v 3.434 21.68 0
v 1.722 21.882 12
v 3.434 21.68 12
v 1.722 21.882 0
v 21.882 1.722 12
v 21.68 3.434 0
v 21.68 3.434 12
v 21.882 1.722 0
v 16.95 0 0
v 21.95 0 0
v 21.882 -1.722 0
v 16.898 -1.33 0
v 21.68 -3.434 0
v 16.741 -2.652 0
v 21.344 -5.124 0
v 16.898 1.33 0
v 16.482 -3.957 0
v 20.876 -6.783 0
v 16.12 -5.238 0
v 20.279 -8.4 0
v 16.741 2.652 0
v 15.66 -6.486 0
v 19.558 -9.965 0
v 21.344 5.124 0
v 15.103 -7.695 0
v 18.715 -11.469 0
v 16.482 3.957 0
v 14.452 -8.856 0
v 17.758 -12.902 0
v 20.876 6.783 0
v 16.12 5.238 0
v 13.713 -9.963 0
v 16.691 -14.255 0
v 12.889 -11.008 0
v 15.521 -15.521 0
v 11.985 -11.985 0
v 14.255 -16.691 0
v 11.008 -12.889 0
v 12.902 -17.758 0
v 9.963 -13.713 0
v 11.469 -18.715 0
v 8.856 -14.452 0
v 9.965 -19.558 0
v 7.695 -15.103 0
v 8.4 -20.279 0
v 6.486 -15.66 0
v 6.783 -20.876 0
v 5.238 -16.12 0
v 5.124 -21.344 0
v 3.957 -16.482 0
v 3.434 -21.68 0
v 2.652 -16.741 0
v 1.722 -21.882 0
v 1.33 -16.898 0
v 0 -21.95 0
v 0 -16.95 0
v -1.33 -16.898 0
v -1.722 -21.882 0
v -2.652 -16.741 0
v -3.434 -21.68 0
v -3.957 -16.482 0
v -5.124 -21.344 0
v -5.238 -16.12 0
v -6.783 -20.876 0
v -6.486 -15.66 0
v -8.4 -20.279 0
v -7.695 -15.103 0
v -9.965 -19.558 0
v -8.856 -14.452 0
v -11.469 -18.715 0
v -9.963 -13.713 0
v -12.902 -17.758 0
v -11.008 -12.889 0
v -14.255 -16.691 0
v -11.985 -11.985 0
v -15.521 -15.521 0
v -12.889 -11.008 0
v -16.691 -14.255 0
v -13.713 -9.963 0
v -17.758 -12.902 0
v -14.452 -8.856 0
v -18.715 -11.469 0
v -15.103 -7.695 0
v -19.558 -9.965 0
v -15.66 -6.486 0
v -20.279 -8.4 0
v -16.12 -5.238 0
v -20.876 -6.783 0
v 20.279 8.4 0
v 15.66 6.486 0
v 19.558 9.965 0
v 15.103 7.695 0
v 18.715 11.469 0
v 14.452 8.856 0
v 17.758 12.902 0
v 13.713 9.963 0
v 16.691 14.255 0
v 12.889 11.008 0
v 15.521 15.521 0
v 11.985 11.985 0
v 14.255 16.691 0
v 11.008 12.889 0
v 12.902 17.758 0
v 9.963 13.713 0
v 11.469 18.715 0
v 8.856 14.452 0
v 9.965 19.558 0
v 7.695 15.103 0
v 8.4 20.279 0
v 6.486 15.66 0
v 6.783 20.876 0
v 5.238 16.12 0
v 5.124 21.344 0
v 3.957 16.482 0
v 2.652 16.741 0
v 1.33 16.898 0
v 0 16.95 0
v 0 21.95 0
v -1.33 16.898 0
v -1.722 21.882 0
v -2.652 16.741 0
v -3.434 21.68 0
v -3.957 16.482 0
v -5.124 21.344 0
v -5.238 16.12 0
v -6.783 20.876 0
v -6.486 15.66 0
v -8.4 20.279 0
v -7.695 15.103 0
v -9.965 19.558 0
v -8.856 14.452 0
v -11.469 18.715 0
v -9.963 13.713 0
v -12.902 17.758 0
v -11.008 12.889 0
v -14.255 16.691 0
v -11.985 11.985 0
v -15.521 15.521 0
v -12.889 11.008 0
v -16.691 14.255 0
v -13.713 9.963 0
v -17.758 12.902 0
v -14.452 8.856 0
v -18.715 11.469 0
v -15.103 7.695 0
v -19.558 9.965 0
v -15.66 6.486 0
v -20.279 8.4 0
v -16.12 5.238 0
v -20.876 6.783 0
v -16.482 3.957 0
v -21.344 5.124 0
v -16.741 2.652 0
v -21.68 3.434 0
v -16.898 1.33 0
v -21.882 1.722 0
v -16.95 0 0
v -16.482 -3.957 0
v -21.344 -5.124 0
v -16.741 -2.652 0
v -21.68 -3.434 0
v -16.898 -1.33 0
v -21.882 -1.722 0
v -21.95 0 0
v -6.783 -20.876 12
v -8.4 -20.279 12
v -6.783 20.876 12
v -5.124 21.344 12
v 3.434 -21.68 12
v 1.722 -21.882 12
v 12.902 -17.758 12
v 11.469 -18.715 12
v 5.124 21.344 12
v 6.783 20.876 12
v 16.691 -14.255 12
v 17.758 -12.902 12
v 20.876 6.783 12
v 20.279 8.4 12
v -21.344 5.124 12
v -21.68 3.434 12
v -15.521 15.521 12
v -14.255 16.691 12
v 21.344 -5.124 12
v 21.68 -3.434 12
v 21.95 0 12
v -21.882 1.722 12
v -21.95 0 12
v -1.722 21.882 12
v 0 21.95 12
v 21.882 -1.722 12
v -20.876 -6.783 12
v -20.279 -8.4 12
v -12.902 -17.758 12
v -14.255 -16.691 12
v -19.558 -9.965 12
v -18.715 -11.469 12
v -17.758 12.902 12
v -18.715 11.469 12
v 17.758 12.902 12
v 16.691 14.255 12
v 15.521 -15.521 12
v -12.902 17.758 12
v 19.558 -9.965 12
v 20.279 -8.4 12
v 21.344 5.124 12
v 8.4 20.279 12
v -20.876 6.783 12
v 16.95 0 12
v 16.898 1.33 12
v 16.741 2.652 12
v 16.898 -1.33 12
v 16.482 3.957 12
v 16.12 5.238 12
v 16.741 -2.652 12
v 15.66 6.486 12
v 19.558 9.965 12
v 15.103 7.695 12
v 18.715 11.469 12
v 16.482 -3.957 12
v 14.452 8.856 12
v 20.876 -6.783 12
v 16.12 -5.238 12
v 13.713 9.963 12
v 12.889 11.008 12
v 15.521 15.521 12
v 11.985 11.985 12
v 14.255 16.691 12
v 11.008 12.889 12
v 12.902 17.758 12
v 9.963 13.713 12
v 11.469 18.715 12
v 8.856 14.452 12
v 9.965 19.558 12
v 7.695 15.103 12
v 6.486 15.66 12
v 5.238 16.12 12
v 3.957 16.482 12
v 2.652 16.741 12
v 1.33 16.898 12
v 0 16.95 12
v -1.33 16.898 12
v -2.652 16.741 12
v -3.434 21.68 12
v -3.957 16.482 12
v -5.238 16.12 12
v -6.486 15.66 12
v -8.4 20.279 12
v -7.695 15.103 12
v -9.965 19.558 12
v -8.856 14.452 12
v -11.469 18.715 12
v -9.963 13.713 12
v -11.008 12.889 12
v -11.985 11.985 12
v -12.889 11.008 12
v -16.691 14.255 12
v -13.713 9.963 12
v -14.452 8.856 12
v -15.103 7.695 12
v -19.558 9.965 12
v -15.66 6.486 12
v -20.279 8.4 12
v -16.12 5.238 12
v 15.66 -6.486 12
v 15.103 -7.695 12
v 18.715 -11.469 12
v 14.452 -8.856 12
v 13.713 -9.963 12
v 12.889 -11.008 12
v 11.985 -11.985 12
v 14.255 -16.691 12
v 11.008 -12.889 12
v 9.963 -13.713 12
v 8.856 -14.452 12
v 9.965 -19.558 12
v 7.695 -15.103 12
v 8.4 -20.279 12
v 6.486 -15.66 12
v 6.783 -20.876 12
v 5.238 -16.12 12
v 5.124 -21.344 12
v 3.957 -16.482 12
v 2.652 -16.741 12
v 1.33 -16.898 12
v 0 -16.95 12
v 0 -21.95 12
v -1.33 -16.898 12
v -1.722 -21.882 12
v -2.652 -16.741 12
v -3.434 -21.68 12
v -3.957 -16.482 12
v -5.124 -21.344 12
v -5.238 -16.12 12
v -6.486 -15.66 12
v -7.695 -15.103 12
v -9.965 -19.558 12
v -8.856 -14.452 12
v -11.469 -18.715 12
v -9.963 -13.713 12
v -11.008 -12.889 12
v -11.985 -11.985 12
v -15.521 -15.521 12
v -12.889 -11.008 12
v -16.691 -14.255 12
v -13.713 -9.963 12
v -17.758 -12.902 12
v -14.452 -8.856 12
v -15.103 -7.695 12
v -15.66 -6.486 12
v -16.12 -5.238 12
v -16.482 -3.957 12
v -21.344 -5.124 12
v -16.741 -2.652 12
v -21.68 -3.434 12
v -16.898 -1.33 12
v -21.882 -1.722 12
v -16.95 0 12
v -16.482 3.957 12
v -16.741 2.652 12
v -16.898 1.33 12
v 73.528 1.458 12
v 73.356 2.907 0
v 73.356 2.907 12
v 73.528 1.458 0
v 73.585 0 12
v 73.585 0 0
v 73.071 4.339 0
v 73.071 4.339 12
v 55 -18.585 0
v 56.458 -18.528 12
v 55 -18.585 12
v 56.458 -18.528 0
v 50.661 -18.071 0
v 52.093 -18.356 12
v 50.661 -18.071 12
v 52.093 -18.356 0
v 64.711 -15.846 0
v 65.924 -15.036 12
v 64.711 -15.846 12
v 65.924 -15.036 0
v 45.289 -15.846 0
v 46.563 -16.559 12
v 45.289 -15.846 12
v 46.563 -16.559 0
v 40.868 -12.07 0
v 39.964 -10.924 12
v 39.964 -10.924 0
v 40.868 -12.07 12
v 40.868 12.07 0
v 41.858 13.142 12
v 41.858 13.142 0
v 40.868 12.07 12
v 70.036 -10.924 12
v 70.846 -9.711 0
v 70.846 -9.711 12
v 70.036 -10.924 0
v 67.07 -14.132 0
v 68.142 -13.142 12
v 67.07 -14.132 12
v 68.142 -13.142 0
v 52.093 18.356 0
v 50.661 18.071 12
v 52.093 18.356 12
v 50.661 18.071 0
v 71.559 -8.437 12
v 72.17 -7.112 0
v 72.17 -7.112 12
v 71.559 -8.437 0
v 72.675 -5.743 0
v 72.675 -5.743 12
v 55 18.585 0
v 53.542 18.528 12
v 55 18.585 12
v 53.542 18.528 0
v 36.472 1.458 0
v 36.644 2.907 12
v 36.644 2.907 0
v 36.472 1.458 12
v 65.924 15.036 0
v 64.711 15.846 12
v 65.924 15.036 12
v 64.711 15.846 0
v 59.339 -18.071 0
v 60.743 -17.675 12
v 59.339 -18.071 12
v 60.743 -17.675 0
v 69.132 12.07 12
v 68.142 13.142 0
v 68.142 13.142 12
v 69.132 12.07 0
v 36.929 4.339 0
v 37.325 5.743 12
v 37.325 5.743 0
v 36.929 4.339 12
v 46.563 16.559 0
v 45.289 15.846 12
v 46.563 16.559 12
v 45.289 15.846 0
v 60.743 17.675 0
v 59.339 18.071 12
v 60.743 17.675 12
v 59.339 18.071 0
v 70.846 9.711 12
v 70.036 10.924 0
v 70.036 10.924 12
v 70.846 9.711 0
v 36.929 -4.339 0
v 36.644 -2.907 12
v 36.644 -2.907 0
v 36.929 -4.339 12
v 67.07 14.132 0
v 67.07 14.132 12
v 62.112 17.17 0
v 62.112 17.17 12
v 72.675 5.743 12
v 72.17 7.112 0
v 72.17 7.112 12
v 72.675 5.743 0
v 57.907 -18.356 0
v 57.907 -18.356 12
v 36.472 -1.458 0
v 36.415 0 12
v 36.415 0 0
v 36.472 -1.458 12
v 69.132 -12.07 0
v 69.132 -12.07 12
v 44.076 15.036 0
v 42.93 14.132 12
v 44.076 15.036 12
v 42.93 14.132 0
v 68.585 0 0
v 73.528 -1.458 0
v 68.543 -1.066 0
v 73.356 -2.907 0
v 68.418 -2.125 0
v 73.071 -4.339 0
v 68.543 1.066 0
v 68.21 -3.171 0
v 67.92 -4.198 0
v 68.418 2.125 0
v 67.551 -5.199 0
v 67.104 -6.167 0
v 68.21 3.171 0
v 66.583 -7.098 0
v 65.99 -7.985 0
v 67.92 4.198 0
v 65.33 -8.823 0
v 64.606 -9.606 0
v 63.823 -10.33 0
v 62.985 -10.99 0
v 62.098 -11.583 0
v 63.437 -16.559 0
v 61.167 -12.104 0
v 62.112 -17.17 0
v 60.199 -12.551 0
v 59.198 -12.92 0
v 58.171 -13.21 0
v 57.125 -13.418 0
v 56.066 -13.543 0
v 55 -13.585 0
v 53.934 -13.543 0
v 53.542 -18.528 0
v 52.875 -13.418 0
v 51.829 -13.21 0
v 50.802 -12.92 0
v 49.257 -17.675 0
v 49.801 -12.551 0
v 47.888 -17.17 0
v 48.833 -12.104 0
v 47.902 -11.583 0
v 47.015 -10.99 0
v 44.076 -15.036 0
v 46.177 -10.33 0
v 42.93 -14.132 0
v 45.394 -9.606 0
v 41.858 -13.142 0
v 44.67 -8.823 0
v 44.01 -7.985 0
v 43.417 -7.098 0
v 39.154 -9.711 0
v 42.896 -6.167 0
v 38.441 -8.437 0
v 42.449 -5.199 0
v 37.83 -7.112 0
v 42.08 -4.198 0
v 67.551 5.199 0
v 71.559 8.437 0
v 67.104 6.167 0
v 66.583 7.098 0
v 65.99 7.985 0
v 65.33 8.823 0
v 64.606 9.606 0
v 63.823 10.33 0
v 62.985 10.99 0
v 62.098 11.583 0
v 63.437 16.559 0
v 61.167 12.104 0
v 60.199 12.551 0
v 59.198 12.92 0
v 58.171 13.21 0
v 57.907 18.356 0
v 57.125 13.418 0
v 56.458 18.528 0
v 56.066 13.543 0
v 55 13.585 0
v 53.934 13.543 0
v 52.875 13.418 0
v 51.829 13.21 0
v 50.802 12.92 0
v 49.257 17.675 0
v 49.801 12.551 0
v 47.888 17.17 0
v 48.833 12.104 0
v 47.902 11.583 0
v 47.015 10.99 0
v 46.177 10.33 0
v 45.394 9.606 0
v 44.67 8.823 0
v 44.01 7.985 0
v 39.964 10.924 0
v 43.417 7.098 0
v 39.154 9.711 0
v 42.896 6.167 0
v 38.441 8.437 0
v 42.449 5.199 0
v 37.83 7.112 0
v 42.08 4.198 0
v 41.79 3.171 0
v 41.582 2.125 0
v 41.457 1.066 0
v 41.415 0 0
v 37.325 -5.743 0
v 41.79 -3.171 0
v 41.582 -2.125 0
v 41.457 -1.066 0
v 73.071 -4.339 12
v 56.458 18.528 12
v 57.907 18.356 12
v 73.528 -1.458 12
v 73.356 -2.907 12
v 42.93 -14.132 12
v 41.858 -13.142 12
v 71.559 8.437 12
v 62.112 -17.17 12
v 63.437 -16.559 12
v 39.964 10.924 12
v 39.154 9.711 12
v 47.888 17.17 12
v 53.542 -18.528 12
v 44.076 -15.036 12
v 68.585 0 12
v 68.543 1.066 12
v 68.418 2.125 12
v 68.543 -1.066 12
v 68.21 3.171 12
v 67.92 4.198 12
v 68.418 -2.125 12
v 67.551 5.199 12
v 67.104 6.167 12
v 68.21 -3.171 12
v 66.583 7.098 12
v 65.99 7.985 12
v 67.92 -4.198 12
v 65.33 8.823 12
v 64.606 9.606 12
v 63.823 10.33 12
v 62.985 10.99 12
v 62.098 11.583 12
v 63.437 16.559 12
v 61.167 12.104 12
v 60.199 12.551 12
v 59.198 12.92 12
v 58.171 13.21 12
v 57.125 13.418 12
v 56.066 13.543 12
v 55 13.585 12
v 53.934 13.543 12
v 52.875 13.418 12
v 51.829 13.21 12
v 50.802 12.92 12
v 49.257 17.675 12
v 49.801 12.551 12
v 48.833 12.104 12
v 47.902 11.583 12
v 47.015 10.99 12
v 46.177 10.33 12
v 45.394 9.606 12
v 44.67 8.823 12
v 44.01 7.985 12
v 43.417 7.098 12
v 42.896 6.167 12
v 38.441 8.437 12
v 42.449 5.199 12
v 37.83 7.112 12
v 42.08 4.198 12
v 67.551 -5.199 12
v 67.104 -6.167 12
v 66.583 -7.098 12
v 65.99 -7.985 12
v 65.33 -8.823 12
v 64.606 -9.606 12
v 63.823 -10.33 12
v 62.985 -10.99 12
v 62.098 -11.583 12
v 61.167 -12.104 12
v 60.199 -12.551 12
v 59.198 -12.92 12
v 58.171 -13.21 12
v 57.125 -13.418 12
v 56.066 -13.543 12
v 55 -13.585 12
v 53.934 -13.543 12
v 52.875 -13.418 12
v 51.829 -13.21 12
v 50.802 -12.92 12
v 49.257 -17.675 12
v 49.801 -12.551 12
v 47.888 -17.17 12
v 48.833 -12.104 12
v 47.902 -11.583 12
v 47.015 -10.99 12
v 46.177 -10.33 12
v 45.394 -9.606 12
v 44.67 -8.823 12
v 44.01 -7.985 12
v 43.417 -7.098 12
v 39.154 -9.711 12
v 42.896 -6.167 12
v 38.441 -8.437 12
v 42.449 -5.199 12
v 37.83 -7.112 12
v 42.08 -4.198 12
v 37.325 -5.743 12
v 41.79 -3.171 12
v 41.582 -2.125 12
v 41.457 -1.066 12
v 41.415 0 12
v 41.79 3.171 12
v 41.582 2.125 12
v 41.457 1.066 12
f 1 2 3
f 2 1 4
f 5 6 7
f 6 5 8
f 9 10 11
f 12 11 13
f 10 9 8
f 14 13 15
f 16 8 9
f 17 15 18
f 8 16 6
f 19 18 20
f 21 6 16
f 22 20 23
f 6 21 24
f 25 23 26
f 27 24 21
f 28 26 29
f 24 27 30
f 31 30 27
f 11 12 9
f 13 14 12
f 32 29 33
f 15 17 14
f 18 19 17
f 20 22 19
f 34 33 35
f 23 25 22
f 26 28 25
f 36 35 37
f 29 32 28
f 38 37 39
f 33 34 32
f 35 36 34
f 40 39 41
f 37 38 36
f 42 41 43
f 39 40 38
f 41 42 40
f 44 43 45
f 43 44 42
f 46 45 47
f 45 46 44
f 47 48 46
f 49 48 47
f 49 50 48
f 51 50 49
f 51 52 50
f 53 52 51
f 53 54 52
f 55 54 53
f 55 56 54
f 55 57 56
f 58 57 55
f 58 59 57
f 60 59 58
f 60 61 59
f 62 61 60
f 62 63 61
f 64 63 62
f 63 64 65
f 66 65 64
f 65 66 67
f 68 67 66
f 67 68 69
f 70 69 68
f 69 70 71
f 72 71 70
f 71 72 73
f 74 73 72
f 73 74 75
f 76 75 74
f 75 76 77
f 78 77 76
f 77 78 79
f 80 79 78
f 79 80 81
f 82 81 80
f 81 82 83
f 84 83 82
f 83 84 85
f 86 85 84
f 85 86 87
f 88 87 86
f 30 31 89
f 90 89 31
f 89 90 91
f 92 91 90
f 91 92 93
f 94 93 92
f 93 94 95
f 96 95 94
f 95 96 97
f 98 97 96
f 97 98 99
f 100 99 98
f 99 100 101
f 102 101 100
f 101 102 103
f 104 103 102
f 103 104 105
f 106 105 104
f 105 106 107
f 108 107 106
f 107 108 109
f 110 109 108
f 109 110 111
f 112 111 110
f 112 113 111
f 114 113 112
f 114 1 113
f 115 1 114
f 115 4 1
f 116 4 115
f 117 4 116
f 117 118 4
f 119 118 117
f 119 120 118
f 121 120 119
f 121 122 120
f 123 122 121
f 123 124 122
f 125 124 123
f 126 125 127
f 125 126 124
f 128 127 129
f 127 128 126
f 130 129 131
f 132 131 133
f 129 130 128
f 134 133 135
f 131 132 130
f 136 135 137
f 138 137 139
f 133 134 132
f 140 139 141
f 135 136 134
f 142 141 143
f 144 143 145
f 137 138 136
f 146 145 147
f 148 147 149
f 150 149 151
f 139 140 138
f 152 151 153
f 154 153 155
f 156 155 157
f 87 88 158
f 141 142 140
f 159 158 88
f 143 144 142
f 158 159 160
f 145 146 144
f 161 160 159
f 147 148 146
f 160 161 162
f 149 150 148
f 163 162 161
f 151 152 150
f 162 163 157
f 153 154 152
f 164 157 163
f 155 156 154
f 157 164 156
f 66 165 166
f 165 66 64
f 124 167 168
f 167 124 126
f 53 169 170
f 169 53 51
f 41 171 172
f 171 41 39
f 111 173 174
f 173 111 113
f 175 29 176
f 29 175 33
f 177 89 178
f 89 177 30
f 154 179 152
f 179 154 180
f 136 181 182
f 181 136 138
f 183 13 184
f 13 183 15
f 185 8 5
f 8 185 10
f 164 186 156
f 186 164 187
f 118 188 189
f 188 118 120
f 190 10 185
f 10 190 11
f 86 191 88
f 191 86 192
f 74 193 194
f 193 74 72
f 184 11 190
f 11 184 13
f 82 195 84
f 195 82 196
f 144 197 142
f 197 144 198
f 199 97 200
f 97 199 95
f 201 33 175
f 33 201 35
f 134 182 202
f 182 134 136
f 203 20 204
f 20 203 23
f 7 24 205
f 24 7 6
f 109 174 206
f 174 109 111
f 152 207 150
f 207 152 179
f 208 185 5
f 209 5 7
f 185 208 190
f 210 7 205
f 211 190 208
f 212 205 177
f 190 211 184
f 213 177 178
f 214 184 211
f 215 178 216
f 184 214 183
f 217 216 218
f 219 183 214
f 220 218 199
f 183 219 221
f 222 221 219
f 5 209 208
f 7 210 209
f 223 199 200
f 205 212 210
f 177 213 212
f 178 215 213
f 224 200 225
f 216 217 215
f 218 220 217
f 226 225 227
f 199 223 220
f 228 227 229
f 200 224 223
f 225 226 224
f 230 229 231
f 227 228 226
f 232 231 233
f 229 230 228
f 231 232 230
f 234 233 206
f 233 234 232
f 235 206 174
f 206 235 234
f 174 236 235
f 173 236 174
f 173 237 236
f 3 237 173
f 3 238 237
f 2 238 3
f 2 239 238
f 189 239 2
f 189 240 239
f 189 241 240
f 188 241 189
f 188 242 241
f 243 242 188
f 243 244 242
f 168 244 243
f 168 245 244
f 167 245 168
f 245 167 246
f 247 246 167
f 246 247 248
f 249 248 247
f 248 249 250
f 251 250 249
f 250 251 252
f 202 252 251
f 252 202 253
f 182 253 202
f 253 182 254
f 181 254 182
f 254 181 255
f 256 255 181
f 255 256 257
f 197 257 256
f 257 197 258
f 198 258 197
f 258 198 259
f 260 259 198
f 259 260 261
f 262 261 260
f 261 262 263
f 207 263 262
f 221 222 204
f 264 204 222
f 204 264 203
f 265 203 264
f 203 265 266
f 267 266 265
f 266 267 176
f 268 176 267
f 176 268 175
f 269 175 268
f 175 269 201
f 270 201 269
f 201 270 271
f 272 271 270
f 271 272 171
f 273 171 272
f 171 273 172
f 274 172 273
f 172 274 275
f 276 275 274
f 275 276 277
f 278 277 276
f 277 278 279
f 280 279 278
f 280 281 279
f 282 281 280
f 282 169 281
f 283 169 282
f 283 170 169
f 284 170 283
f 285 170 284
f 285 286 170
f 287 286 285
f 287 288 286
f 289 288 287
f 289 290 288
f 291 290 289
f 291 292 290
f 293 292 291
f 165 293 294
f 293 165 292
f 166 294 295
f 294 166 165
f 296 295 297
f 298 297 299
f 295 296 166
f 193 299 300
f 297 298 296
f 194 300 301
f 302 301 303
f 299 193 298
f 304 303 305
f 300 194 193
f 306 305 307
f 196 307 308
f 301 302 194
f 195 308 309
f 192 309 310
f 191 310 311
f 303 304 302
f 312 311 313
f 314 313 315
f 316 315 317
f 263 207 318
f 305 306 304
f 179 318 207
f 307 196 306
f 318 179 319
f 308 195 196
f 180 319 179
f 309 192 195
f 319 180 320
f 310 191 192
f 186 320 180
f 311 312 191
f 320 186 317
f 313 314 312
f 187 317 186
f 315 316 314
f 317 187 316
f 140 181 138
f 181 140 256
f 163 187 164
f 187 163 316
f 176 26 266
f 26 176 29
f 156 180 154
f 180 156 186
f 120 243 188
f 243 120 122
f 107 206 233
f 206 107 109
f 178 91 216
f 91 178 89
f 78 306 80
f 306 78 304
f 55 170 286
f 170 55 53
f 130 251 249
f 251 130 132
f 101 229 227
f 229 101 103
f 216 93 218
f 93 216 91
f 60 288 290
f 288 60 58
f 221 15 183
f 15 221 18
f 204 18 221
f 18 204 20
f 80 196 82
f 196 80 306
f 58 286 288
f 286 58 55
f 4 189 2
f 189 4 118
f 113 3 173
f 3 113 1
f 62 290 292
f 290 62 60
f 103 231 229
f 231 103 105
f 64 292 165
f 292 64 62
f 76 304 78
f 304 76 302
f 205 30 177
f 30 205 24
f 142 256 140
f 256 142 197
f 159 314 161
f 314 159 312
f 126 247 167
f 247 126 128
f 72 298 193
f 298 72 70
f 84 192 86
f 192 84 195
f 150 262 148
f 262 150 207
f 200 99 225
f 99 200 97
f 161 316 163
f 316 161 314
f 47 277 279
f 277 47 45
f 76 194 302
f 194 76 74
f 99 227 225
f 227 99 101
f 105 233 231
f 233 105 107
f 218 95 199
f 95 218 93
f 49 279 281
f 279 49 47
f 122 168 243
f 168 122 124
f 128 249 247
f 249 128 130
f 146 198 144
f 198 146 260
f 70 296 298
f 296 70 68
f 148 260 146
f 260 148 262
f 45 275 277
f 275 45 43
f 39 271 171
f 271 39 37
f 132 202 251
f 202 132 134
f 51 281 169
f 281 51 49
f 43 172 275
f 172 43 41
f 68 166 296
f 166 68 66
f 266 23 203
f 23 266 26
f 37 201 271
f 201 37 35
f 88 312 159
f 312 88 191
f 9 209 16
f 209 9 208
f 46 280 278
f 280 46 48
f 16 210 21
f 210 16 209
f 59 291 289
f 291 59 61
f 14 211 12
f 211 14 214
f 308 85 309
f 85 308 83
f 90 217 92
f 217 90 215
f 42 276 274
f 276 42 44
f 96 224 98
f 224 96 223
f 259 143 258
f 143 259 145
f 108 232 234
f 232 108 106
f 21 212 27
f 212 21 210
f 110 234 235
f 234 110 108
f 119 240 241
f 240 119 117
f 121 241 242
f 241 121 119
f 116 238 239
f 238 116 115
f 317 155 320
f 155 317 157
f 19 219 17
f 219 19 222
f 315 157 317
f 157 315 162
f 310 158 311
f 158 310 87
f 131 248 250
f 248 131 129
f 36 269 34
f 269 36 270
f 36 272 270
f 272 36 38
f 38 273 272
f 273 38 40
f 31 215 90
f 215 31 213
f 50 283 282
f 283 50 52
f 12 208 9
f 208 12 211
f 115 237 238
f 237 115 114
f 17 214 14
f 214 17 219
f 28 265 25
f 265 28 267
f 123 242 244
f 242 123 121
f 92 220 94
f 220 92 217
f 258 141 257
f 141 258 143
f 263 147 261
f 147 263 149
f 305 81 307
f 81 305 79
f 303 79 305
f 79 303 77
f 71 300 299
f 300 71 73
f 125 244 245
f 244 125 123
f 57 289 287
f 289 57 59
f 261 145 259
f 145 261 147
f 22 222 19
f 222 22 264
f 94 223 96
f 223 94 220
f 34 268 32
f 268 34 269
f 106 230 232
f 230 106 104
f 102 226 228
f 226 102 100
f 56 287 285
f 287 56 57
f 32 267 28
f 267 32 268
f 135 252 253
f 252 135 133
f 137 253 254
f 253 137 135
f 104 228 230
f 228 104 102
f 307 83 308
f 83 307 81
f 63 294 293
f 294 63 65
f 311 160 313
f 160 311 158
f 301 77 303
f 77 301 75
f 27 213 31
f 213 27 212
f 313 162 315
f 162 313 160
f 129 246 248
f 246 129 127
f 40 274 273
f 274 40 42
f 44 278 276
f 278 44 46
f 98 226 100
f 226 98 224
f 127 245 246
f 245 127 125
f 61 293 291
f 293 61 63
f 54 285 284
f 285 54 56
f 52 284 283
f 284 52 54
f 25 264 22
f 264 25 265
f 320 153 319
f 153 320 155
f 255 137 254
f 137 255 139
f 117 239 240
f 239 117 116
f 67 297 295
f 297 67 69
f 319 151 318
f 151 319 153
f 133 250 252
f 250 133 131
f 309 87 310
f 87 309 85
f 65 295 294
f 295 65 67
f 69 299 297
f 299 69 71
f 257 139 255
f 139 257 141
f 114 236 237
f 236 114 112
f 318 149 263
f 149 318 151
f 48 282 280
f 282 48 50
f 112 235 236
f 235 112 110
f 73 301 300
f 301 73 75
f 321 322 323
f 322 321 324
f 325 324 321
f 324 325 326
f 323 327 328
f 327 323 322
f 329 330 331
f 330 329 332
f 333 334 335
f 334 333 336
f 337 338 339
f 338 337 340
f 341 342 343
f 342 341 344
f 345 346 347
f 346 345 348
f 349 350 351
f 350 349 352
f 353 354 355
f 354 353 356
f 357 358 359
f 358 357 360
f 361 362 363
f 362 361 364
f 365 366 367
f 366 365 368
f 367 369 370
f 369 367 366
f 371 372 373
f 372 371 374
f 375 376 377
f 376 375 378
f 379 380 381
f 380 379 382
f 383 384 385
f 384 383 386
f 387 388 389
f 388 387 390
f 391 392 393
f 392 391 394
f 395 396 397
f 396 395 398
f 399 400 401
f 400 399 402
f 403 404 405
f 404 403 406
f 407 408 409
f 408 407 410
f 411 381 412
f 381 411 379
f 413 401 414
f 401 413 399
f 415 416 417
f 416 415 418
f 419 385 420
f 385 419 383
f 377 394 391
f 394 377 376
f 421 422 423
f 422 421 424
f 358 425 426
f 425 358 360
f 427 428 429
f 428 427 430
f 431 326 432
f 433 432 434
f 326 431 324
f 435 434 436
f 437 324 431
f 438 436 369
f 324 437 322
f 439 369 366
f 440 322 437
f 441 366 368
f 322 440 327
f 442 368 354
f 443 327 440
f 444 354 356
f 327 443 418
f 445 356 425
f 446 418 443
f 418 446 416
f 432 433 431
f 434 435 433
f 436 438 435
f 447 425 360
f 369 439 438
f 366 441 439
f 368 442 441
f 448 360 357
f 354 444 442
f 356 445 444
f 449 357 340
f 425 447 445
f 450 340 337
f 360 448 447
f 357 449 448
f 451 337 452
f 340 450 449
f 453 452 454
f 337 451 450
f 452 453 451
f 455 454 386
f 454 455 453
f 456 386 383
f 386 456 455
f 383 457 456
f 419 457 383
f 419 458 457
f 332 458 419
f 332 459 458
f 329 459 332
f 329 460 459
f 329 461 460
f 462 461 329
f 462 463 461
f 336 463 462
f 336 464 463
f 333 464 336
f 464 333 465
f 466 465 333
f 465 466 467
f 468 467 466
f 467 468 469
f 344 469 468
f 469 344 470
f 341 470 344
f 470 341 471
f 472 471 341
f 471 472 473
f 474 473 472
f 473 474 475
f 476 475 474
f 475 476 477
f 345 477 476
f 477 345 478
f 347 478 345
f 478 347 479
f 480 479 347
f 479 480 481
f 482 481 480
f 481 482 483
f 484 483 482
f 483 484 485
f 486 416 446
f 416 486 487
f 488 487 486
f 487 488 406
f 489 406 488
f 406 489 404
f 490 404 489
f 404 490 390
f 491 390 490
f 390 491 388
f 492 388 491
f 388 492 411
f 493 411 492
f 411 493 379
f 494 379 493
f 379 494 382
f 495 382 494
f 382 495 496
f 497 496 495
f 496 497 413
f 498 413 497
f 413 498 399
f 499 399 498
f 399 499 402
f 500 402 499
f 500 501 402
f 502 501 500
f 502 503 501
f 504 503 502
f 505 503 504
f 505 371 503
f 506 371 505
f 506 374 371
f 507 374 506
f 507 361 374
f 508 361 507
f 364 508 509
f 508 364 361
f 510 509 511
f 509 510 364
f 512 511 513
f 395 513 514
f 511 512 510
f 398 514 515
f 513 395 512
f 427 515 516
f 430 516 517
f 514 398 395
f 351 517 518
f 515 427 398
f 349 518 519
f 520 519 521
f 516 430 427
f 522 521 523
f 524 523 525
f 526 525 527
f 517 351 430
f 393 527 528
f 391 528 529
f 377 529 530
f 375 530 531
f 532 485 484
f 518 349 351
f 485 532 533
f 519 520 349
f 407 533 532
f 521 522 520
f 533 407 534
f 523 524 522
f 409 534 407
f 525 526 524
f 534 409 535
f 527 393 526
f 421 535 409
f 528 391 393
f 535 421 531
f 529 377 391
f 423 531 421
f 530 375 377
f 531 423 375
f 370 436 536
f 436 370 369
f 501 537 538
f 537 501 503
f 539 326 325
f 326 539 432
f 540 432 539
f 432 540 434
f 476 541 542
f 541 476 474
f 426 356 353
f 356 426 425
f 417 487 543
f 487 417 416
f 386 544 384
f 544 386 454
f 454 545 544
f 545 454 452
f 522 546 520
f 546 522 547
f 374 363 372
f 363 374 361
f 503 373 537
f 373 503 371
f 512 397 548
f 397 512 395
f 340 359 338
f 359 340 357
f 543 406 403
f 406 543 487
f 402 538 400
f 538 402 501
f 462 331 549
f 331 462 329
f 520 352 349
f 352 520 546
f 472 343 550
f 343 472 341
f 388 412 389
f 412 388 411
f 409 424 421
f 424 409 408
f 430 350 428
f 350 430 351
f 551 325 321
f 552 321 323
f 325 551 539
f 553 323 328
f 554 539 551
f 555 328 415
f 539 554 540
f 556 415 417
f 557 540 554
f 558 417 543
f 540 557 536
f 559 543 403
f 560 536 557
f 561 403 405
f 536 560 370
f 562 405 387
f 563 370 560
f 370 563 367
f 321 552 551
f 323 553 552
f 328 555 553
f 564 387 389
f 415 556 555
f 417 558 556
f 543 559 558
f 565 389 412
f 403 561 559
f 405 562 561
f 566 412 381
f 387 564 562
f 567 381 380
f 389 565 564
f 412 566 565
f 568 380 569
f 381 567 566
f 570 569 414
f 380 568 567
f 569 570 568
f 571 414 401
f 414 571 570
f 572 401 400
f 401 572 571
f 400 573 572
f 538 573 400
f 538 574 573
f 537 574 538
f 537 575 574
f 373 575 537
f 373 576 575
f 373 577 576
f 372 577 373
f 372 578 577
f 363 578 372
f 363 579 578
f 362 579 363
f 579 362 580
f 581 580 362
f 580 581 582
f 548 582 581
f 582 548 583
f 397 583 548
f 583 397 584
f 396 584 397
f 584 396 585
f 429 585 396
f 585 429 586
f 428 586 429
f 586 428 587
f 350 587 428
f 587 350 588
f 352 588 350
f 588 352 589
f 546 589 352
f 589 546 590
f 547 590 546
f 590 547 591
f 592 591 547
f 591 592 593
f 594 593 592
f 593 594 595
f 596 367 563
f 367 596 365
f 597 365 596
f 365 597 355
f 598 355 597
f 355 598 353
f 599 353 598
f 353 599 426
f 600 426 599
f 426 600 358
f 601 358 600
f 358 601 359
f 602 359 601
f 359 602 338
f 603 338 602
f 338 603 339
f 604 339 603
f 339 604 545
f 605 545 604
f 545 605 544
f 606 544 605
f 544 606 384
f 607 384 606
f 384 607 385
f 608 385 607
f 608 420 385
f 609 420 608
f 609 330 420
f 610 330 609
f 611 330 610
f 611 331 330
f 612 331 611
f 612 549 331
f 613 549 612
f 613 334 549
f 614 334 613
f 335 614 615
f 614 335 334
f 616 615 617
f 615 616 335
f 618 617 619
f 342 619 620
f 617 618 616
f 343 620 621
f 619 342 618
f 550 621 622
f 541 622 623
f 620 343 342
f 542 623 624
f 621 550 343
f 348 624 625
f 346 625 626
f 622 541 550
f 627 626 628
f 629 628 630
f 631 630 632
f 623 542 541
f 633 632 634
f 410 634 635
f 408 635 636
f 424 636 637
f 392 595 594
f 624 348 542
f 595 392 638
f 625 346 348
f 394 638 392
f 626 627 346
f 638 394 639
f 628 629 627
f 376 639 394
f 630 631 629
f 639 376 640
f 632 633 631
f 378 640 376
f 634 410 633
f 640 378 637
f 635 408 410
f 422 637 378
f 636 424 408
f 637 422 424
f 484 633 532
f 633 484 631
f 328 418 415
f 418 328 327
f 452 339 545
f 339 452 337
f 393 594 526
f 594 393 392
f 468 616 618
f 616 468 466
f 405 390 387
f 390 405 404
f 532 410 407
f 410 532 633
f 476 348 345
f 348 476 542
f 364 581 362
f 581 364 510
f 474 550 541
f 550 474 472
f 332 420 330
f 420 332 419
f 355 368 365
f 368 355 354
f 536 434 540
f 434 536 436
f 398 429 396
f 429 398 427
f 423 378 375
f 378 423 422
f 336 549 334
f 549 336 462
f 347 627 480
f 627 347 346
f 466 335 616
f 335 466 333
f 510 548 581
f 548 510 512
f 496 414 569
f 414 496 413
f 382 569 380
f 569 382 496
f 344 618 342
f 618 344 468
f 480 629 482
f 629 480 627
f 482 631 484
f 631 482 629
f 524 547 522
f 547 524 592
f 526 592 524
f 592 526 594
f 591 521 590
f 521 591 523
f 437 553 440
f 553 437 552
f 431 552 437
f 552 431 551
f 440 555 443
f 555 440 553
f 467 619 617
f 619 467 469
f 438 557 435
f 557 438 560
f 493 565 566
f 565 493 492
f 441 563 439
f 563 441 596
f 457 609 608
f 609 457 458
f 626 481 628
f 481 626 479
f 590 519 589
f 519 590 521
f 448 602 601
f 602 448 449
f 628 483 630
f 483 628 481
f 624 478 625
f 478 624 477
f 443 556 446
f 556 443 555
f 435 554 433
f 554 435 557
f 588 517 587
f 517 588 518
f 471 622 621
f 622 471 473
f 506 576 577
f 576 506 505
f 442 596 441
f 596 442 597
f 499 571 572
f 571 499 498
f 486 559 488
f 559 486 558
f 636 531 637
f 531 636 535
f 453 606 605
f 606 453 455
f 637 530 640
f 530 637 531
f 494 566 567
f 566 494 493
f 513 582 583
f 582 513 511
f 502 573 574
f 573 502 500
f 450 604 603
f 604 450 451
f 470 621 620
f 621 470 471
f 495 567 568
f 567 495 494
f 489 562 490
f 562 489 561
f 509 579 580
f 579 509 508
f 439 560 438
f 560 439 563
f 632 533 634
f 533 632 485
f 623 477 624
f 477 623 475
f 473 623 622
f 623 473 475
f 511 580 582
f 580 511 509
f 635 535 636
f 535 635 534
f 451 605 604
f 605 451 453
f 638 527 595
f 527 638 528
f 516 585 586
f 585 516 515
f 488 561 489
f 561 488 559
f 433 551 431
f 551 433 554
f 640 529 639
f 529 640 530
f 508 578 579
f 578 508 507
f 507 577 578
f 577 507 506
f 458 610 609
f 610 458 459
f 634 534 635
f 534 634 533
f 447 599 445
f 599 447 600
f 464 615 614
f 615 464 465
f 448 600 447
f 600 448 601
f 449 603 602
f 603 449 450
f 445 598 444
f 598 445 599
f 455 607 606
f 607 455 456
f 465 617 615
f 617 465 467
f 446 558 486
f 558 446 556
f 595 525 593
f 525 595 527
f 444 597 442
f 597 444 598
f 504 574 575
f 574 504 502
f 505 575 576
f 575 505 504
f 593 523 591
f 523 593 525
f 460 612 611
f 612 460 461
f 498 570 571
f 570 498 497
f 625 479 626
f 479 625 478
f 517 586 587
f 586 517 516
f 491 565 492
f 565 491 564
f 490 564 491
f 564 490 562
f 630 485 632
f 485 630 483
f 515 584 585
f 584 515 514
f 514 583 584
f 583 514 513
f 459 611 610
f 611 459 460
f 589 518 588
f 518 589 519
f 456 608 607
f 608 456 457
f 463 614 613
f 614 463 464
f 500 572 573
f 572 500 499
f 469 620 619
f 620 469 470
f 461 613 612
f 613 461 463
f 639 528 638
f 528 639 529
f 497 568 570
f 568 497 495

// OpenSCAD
// file: desktop-rc-plane-stand.scad
// Desktop RC airplane stand — prototype, dimensions in mm.
// Select a printable part or the assembled layout. Measure pipe before printing.
part = "assembly"; // [assembly,corner,tee,cradle,fit_1,fit_075]
pipe_1_od = 33.40;
pipe_075_od = 26.67;
diametral_clearance = 0.50;
wall = 5;
stop_offset = 26; // hub center to pipe end; keeps blind bores separate
socket_depth = 35;
bolt_d = 4.5; // M4 through bolt, washers and locknut; drill PVC in assembled joint
base_length = 460; // corner center spacing, nose-tail direction
base_width = 340; // corner center spacing, left-right
post_centers = 180; // tee center to cradle center
arm_angle = 40; // outward from vertical; included V angle = 80 degrees
arm_cut = 140; // total length including inserted portion
noodle_od = 65; // visualization only: replace with measured diameter
noodle_length = 95;
$fn = $preview ? 40 : 80;

mouth = stop_offset + socket_depth;
big_r = (pipe_1_od + diametral_clearance)/2 + wall;
small_r = (pipe_075_od + diametral_clearance)/2 + wall;
base_z = big_r;
assert(wall >= 4 && socket_depth >= 30);
assert(diametral_clearance >= 0 && diametral_clearance <= 1.5);
assert(base_length > 2*mouth && base_width/2 > 2*mouth);
assert(post_centers > 2*mouth && arm_cut > socket_depth + noodle_length);
assert(arm_angle >= 30 && arm_angle <= 55);

// Orient local +Z along an arbitrary vector; local X/Y remain transverse.
module along(v) {
    rotate([0, acos(v[2]/norm(v)), atan2(v[1],v[0])]) children();
}
module socket_solid(v, od) {
    along(v) cylinder(h=mouth, d=od+diametral_clearance+2*wall);
}
module socket_void(v, od) {
    along(v) {
        translate([0,0,stop_offset]) cylinder(h=socket_depth+1,d=od+diametral_clearance);
        // Small entry chamfer.
        translate([0,0,mouth-1]) cylinder(h=2,d1=od+diametral_clearance,d2=od+diametral_clearance+4);
        translate([0,0,mouth-12]) rotate([90,0,0]) cylinder(h=od+2*wall+6,d=bolt_d,center=true);
    }
}
module connector(dirs, ods) {
    difference() {
        union() {
            sphere(r=big_r);
            for(i=[0:len(dirs)-1]) socket_solid(dirs[i],ods[i]);
        }
        for(i=[0:len(dirs)-1]) socket_void(dirs[i],ods[i]);
    }
}
module corner() { connector([[1,0,0],[0,1,0]],[pipe_1_od,pipe_1_od]); }
module tee() { connector([[1,0,0],[-1,0,0],[0,0,1]],[pipe_1_od,pipe_1_od,pipe_1_od]); }
module cradle() {
    connector([[0,0,-1],[sin(arm_angle),0,cos(arm_angle)],[-sin(arm_angle),0,cos(arm_angle)]],
              [pipe_1_od,pipe_075_od,pipe_075_od]);
}
module fit_ring(od) {
    difference() {
        cylinder(h=12,d=od+diametral_clearance+2*wall);
        translate([0,0,-1]) cylinder(h=14,d=od+diametral_clearance);
    }
}
module tube(v,length,od) {
    along(v) difference() {
        cylinder(h=length,d=od);
        translate([0,0,-1]) cylinder(h=length+2,d=od-5);
    }
}
module assembly() {
    // X = across airplane, Y = nose-tail, Z = up.
    for(y=[-base_length/2,base_length/2]) {
        for(x=[-base_width/2,base_width/2]) {
            translate([x,y,base_z])
                scale([x<0?1:-1,y<0?1:-1,1]) color("#334d60") corner();
        }
        translate([0,y,base_z]) {
            color("#334d60") tee();
            for(s=[-1,1]) color("#d6dce0")
                translate([s*stop_offset,0,0]) tube([s,0,0],base_width/2-2*stop_offset,pipe_1_od);
            color("#d6dce0") translate([0,0,stop_offset]) tube([0,0,1],post_centers-2*stop_offset,pipe_1_od);
            translate([0,0,post_centers]) {
                color("#334d60") cradle();
                for(s=[-1,1]) along([s*sin(arm_angle),0,cos(arm_angle)]) {
                    color("#d6dce0") translate([0,0,stop_offset]) tube([0,0,1],arm_cut,pipe_075_od);
                    // Foam extends 8 mm beyond the hard pipe tip.
                    color("#e8ce42") translate([0,0,stop_offset+arm_cut-noodle_length+8])
                        difference() {
                            cylinder(h=noodle_length,d=noodle_od);
                            translate([0,0,-1]) cylinder(h=noodle_length+2,d=pipe_075_od);
                        }
                }
            }
        }
    }
    for(x=[-base_width/2,base_width/2]) color("#d6dce0")
        translate([x,-base_length/2+stop_offset,base_z]) tube([0,1,0],base_length-2*stop_offset,pipe_1_od);
}
// Print parts flat on their side. Socket axes remain parallel to the bed;
// support the upper bore surfaces. Remove support before fitting pipe.
if(part=="assembly") assembly();
else if(part=="corner") translate([0,0,big_r]) corner();
else if(part=="tee") translate([0,0,big_r]) rotate([90,0,0]) tee();
else if(part=="cradle") translate([0,0,big_r]) rotate([90,0,0]) cradle();
else if(part=="fit_1") fit_ring(pipe_1_od);
else if(part=="fit_075") fit_ring(pipe_075_od);
else assert(false,"Unknown part selector");

echo(base_pipe_cuts=[base_length-2*stop_offset,base_width/2-2*stop_offset,post_centers-2*stop_offset]);
// main file
// Print both rings before full connectors; edit dimensions in the main file.
use <desktop-rc-plane-stand.scad>
fit_ring(33.40);
translate([55,0,0]) fit_ring(26.67);
